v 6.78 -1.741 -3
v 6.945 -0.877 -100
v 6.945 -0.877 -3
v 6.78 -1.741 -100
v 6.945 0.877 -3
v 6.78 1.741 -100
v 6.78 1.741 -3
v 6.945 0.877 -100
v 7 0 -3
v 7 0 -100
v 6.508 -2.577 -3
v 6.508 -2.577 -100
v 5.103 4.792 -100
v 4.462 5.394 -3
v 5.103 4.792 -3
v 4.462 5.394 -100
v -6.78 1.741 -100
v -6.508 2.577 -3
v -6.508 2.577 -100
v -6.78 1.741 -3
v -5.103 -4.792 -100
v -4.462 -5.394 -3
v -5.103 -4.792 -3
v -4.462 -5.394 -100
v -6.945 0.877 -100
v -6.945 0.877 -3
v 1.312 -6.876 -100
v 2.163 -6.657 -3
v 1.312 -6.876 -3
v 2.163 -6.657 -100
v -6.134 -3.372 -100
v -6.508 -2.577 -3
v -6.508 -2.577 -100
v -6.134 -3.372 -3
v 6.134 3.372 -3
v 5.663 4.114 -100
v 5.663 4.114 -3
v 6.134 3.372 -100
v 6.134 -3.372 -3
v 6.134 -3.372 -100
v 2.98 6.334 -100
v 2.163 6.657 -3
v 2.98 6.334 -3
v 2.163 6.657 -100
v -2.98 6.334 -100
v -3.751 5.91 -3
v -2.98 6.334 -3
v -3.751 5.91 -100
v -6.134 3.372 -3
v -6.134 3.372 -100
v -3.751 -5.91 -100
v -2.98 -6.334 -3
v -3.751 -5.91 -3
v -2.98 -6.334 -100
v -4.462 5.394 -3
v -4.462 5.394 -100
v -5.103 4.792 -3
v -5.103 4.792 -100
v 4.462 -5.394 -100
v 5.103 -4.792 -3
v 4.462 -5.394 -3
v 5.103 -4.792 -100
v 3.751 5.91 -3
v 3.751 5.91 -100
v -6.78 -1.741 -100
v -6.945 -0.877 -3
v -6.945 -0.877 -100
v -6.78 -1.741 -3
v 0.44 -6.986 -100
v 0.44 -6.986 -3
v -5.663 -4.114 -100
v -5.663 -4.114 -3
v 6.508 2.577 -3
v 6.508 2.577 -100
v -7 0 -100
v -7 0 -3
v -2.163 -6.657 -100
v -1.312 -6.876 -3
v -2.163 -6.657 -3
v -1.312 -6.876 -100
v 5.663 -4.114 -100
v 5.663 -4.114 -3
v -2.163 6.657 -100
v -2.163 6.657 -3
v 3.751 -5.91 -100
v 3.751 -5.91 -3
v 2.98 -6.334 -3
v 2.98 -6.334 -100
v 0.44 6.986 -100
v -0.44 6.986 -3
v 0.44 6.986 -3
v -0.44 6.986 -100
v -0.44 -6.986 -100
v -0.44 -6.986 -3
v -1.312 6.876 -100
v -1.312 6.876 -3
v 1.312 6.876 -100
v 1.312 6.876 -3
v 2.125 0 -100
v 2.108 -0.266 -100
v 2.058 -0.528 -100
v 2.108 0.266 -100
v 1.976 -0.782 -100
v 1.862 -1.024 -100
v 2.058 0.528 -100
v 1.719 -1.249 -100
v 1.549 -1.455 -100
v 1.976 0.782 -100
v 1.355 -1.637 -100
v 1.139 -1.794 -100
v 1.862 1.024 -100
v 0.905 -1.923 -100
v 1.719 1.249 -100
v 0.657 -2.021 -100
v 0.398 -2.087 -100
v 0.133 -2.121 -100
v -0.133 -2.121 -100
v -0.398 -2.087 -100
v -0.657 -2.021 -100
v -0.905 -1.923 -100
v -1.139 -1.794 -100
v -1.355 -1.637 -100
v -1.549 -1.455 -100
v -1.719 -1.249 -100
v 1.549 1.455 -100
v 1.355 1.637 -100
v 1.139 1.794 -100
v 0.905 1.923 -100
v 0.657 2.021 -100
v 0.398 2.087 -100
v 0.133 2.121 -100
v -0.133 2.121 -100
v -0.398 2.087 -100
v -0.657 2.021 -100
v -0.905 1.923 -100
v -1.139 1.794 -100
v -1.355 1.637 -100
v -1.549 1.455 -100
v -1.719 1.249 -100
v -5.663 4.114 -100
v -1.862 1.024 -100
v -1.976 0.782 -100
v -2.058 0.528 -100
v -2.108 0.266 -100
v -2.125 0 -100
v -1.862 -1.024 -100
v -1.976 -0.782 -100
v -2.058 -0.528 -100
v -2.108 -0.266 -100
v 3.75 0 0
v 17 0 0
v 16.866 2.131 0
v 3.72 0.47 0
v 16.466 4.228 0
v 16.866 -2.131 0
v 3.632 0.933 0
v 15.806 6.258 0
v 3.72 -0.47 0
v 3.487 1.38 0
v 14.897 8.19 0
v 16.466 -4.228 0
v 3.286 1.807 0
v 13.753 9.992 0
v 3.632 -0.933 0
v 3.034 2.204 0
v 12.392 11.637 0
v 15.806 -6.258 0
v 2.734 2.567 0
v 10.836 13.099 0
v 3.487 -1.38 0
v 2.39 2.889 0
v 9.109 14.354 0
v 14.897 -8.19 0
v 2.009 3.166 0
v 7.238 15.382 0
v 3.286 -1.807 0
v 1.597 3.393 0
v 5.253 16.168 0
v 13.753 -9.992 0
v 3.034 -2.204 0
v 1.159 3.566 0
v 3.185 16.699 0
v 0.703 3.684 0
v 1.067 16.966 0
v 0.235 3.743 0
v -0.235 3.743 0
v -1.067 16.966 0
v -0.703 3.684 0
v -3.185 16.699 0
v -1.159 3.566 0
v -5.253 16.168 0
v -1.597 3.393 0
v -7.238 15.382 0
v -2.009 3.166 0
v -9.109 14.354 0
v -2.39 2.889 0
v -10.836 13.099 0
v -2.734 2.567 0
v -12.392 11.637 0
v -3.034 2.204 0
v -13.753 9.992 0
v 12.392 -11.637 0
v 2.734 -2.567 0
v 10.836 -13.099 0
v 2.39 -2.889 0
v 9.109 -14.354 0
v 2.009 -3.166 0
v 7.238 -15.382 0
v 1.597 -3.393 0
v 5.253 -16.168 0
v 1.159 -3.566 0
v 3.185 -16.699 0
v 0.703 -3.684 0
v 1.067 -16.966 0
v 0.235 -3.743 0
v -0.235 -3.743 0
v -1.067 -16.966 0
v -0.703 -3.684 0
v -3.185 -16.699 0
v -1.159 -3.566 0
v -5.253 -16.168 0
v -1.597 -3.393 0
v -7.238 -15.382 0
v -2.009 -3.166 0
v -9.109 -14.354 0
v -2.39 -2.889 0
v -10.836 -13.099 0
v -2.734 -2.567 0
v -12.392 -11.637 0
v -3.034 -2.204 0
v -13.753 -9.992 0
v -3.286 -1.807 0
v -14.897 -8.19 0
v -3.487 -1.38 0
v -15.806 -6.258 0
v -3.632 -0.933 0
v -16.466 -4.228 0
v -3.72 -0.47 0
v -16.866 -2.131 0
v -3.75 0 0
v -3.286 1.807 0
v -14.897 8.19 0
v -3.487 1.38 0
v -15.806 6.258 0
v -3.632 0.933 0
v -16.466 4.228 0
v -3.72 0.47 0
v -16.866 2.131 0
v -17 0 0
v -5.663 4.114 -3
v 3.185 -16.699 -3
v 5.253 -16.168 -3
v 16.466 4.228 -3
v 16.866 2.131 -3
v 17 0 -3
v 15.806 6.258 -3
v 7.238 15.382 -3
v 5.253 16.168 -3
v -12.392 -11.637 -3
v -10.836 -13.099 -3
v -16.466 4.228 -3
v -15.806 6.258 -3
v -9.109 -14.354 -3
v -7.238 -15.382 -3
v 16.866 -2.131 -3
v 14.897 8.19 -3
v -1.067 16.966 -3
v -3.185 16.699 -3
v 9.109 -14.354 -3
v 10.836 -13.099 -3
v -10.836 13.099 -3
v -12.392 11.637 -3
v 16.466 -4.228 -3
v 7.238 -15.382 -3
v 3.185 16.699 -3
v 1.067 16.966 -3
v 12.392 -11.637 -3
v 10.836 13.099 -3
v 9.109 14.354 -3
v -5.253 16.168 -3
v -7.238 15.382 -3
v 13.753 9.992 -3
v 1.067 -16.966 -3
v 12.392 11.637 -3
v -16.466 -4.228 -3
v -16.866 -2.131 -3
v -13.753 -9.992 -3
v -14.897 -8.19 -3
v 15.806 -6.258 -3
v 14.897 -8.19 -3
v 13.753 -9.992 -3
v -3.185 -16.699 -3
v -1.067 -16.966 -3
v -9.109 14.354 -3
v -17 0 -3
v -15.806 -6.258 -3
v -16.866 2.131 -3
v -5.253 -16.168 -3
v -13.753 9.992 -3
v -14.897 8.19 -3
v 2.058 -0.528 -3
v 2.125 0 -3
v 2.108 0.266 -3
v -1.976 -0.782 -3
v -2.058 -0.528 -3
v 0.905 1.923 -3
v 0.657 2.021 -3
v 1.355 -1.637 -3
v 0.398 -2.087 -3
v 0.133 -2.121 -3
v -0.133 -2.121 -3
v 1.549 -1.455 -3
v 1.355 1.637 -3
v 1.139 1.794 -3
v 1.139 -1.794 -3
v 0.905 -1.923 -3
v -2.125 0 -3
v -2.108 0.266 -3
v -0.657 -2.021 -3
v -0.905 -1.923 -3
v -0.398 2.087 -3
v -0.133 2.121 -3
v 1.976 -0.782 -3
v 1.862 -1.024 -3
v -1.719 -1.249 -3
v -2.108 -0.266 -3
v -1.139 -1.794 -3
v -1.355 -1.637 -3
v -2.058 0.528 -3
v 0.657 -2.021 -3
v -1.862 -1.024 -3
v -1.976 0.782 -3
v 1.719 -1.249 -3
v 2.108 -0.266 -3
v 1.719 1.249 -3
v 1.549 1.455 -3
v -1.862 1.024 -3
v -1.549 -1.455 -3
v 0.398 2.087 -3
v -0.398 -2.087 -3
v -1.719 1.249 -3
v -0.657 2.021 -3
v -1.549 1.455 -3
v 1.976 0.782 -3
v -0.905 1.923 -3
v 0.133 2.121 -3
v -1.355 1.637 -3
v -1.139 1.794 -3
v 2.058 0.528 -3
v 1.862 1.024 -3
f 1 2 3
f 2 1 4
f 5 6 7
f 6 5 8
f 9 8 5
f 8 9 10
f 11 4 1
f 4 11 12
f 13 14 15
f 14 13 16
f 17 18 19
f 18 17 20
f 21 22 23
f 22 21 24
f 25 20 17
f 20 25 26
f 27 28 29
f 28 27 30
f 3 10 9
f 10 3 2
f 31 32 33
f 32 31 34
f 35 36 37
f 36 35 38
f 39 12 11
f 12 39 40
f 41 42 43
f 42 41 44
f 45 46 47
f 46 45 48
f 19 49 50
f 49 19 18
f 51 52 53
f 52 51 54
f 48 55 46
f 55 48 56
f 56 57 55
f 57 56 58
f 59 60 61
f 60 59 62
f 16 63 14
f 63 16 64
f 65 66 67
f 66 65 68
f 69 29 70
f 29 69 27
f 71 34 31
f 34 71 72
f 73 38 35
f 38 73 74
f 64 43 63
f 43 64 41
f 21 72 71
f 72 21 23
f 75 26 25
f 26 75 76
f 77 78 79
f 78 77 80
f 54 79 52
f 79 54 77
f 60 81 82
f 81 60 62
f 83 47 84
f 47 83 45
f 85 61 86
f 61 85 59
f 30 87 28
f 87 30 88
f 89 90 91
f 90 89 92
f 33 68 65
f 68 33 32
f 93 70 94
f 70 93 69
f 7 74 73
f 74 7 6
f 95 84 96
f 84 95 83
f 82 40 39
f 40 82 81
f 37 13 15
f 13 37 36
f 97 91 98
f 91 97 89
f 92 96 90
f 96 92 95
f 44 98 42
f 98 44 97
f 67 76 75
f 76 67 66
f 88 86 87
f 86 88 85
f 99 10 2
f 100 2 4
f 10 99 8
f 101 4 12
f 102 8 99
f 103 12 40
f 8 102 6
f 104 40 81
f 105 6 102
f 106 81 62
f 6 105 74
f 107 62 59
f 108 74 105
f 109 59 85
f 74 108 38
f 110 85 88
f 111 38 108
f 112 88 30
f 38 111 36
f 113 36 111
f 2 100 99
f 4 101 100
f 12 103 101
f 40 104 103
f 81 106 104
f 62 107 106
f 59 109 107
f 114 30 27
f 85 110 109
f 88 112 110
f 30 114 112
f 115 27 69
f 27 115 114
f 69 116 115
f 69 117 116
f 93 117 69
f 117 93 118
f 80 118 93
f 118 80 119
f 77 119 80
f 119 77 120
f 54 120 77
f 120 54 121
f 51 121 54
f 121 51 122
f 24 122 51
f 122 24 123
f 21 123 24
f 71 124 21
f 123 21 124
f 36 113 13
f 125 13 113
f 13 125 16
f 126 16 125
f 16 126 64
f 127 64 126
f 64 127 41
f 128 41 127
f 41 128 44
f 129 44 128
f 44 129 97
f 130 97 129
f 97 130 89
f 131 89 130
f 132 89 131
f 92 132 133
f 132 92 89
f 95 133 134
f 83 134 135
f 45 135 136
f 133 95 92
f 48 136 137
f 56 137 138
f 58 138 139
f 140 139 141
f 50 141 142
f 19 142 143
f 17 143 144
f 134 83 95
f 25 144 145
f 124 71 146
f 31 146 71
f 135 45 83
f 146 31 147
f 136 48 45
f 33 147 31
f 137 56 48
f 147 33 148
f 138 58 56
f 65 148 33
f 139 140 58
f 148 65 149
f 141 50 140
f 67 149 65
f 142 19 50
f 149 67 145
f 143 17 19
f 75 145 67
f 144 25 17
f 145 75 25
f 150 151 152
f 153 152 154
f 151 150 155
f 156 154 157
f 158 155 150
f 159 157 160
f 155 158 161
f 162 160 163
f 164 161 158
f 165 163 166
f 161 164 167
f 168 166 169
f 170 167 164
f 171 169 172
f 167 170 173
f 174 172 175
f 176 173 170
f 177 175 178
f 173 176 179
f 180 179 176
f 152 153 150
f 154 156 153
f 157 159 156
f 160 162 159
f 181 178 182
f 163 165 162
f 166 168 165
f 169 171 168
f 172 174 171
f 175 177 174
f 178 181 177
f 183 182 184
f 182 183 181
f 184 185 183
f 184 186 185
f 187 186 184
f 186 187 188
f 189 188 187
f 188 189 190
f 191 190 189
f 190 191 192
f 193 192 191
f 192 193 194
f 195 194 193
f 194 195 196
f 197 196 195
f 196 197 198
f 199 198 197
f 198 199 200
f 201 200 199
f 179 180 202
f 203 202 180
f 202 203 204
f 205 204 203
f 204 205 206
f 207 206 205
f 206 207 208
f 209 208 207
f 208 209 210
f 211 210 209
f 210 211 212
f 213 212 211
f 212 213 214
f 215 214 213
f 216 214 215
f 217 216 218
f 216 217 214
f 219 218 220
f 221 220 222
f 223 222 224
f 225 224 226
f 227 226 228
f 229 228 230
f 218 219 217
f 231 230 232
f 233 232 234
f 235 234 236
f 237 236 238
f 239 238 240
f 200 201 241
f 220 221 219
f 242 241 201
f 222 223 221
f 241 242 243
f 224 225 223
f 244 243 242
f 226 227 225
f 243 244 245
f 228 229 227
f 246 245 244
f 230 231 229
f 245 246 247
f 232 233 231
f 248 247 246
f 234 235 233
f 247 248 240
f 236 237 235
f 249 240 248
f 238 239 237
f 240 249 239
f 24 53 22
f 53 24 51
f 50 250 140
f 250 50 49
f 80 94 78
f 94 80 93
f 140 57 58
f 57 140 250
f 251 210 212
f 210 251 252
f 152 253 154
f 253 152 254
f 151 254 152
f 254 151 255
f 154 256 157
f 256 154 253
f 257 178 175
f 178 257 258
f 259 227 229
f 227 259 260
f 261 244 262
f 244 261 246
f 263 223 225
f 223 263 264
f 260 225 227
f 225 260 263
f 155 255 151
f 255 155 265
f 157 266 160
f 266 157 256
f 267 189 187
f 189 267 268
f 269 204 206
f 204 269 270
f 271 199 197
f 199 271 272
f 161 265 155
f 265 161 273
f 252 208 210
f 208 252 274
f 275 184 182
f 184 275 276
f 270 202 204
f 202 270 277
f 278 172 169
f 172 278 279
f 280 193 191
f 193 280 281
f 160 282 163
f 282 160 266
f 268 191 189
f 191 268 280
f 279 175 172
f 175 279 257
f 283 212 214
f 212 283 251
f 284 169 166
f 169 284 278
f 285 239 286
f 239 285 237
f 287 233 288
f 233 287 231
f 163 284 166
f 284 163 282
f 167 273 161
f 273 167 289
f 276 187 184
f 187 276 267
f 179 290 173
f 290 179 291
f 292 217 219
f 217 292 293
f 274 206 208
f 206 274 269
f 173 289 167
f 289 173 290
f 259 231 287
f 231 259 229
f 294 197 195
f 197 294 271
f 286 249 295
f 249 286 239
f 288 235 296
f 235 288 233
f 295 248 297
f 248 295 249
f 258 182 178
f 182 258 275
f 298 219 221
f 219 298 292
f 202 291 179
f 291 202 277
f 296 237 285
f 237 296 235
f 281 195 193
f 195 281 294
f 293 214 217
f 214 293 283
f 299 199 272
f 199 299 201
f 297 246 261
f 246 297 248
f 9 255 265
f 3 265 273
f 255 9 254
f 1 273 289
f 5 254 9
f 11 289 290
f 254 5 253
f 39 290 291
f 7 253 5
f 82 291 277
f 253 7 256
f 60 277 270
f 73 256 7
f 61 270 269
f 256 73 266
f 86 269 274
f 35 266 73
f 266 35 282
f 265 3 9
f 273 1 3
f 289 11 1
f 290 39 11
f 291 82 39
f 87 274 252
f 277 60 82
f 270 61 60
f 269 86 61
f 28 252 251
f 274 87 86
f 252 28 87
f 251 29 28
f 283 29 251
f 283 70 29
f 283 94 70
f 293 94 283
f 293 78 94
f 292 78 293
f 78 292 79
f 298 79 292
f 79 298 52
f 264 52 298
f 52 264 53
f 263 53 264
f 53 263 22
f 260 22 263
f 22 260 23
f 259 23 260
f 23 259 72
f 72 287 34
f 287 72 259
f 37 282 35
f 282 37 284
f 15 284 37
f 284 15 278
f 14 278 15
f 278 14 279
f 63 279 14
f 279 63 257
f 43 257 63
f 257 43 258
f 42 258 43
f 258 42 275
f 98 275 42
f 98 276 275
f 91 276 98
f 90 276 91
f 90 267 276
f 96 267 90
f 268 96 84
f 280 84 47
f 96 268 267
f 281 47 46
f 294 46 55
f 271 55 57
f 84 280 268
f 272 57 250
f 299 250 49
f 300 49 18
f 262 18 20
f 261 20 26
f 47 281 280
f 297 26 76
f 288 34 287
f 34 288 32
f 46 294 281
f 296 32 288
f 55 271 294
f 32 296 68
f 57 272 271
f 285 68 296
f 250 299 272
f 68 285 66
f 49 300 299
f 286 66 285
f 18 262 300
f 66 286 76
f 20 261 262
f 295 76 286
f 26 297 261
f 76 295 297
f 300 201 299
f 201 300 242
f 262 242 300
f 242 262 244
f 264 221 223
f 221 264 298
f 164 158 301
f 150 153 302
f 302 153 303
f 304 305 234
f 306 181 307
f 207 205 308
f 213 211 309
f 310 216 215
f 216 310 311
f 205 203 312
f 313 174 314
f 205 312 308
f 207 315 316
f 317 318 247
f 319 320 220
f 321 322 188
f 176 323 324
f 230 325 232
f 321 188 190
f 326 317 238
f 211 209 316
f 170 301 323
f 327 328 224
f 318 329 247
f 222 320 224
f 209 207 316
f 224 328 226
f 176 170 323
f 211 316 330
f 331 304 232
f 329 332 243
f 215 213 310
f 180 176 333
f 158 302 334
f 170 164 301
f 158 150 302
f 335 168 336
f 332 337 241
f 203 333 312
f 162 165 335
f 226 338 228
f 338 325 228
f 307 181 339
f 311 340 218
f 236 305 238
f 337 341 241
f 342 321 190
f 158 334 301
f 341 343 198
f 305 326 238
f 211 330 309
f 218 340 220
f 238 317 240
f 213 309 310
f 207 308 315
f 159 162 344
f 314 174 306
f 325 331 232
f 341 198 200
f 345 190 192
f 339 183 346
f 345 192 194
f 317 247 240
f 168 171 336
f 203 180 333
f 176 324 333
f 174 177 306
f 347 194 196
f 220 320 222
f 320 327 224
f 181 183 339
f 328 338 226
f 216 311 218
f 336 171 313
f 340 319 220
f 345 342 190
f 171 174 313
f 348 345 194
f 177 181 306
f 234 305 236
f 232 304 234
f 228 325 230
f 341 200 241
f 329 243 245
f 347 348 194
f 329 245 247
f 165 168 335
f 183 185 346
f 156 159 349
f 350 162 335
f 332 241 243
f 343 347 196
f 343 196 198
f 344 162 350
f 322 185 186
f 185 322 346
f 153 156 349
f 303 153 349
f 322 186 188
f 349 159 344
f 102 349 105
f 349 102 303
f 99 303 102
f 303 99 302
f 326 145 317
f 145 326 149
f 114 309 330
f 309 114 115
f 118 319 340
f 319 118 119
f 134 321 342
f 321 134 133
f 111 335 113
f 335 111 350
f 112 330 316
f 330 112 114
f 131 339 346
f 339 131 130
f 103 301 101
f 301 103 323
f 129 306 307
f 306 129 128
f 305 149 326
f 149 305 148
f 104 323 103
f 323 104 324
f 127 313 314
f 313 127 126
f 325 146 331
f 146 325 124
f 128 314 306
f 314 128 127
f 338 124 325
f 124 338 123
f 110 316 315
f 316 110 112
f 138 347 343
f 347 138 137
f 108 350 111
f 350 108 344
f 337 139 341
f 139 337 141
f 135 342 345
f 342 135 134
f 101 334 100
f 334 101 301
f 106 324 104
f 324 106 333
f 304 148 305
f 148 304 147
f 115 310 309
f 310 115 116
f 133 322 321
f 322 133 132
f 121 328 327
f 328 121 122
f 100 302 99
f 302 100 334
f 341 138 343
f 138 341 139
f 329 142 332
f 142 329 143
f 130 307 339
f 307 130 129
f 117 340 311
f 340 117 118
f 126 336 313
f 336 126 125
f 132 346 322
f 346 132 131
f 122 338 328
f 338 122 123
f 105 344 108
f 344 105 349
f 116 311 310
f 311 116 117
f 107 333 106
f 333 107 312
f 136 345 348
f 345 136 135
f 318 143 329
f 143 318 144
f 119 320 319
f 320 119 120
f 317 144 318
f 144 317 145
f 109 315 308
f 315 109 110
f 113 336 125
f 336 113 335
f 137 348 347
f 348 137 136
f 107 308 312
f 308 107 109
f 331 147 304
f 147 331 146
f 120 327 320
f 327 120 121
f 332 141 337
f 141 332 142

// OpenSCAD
$fn = 50;


difference() {
	union() {
		translate(v = [0, 0, -100.0000000000]) {
			cylinder(h = 100, r = 7.0000000000);
		}
		translate(v = [0, 0, -3.0000000000]) {
			cylinder(h = 3, r = 17.0000000000);
		}
	}
	union() {
		translate(v = [0, 0, 0]) {
			rotate(a = [0, 0, 0]) {
				difference() {
					union() {
						#translate(v = [0, 0, -100.0000000000]) {
							cylinder(h = 100, r = 2.0000000000);
						}
						#translate(v = [0, 0, -3]) {
							cylinder(h = 3, r = 7.0000000000, r1 = 2.1250000000, r2 = 3.7500000000);
						}
						#translate(v = [0, 0, -100.0000000000]) {
							cylinder(h = 100, r = 2.1250000000);
						}
						#translate(v = [0, 0, -100.0000000000]) {
							cylinder(h = 100, r = 2.0000000000);
						}
					}
					union();
				}
			}
		}
	}
}
